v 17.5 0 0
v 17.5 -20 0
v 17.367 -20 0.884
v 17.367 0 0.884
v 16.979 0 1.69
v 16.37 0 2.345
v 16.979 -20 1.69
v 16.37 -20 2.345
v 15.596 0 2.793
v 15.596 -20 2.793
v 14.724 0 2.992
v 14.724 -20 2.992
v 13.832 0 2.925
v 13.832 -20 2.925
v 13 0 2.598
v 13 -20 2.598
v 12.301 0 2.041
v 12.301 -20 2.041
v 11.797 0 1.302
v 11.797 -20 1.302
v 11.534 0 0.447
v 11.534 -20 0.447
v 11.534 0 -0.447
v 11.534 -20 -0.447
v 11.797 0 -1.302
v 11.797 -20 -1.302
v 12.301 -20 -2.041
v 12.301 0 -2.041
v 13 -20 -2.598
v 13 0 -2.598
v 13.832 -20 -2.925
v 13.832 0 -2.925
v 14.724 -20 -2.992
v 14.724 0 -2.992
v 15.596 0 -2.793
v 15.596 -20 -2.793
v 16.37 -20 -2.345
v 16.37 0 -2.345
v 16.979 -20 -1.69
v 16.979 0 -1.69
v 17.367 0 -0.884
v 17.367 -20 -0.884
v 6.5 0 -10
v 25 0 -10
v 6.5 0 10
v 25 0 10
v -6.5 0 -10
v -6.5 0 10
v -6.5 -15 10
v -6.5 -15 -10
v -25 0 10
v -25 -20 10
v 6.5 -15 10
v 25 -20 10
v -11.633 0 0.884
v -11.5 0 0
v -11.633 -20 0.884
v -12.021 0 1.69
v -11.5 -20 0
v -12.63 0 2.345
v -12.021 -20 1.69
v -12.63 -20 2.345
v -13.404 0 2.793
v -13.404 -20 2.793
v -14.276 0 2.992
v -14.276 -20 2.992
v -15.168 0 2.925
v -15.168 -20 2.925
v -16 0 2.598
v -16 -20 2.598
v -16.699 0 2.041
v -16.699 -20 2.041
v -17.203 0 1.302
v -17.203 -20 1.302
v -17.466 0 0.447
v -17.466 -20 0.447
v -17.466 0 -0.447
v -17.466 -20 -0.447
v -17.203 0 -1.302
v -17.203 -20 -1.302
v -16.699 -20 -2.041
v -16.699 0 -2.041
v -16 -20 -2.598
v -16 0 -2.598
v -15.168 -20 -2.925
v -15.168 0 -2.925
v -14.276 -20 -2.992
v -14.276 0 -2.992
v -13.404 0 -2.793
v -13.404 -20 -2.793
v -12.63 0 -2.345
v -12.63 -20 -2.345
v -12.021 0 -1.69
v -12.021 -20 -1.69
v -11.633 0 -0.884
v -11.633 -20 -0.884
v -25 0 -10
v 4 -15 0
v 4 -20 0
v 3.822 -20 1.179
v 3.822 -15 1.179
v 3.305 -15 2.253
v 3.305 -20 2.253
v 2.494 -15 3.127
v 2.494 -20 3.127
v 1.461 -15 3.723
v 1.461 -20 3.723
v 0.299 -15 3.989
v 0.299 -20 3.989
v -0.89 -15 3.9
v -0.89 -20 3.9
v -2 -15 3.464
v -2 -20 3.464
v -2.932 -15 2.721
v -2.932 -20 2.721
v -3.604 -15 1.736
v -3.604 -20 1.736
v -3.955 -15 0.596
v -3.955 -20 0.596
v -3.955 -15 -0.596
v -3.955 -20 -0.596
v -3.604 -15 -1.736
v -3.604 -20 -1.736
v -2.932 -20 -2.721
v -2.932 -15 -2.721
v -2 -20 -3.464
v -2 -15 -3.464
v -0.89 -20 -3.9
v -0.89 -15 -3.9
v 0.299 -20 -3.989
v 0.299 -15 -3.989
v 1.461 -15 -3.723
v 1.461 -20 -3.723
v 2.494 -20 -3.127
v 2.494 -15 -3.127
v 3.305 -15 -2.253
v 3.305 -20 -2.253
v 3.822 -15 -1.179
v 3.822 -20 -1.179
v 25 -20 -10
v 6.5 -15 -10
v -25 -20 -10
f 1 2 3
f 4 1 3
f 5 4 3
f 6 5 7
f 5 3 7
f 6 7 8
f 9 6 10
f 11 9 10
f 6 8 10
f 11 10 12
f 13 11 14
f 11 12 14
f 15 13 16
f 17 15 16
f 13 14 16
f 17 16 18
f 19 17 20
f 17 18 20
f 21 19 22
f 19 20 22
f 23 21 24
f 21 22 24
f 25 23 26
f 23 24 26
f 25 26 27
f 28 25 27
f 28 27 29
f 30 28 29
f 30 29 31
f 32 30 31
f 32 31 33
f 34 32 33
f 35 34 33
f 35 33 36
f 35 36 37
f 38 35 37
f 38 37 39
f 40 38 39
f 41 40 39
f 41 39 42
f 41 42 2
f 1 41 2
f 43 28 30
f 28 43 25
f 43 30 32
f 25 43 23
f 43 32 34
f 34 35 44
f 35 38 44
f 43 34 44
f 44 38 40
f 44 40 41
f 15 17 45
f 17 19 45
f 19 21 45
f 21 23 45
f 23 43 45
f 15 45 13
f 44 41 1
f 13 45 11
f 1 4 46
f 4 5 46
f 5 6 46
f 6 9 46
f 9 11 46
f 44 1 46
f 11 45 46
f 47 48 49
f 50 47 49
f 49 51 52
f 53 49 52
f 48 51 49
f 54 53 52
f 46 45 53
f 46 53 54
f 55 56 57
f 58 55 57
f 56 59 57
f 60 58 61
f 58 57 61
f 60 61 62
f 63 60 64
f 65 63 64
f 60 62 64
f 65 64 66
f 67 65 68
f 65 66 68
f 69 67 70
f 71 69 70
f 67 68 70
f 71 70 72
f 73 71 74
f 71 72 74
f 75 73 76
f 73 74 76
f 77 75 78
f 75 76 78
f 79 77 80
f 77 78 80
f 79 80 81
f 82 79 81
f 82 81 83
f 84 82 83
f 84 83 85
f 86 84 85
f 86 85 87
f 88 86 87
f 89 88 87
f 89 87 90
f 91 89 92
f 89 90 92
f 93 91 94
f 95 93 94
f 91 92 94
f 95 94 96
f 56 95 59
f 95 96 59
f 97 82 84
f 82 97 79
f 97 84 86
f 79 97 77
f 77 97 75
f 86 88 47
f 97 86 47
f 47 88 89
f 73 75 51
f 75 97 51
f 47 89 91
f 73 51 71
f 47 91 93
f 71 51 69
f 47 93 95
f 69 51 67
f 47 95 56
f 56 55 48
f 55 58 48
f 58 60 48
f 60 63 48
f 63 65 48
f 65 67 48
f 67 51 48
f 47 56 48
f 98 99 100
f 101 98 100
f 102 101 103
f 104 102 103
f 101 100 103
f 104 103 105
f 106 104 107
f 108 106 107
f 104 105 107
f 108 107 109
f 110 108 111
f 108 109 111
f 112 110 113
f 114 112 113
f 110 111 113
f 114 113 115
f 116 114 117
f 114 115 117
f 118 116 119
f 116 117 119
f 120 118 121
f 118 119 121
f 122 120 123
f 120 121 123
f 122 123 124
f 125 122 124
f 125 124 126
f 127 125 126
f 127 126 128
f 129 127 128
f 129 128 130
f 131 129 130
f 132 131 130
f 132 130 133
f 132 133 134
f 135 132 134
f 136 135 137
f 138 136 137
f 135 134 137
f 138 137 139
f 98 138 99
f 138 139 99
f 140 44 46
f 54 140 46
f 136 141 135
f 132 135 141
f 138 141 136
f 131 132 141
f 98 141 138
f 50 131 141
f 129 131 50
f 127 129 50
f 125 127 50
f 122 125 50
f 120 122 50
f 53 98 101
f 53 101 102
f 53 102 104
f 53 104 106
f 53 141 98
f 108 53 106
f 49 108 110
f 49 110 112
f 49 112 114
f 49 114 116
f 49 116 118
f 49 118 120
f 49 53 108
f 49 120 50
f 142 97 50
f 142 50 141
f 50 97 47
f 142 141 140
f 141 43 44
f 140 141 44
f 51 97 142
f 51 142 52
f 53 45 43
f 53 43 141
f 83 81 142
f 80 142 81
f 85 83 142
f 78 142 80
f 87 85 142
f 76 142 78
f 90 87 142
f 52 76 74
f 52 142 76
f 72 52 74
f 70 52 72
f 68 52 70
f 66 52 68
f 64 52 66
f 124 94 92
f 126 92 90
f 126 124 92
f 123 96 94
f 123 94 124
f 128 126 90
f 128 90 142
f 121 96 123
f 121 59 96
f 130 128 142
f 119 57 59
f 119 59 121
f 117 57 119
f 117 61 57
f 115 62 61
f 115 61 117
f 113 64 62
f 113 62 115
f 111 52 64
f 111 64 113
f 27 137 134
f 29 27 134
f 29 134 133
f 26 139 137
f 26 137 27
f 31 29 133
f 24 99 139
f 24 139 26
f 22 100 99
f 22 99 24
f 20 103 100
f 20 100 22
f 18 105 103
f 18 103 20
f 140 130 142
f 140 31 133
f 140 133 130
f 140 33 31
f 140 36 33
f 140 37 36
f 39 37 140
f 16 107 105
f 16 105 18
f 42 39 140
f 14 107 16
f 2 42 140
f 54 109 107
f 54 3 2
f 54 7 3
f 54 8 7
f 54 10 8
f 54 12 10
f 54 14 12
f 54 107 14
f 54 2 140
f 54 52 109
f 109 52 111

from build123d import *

# Parameters (mm, degrees)
SKETCH_W        = 50
SKETCH_H        = 20
PAD_DEPTH       = 20
SKETCH001_W     = 13
SKETCH001_H     = 15
POCKET_DEPTH    = 20.001
SKETCH002_R     = 4
SKETCH002_R_2   = 3
POCKET001_DEPTH = 5
POCKET002_DEPTH = 20.001


with BuildPart() as part:
    # Sketch → Pad (new body)
    with BuildSketch(Plane.XZ):
        Rectangle(SKETCH_W, SKETCH_H)
    extrude(amount=PAD_DEPTH)

    # Sketch001 (on Face1 of Pad) → Pocket (cut, through all)
    with BuildSketch(Plane(origin=(0, 0, 10), x_dir=(-1, 0, 0), z_dir=(0, 0, 1))):
        with Locations((0, 7.5)):
            Rectangle(SKETCH001_W, SKETCH001_H)
    extrude(amount=-POCKET_DEPTH, mode=Mode.SUBTRACT)

    # Sketch002 (on Face8 of Pocket) → Pocket001 (cut)
    with BuildSketch(Plane.XZ.offset(20)):
        Circle(SKETCH002_R)
        with Locations((-14.5, 0)):
            Circle(SKETCH002_R_2)
        with Locations((14.5, 0)):
            Circle(SKETCH002_R_2)
    extrude(amount=-POCKET001_DEPTH, mode=Mode.SUBTRACT)

    # Sketch002 (on Face8 of Pocket) → Pocket002 (cut, through all)
    with BuildSketch(Plane.XZ.offset(20)):
        Circle(SKETCH002_R)
        with Locations((-14.5, 0)):
            Circle(SKETCH002_R_2)
        with Locations((14.5, 0)):
            Circle(SKETCH002_R_2)
    extrude(amount=-POCKET002_DEPTH, mode=Mode.SUBTRACT)


solid = part.part
